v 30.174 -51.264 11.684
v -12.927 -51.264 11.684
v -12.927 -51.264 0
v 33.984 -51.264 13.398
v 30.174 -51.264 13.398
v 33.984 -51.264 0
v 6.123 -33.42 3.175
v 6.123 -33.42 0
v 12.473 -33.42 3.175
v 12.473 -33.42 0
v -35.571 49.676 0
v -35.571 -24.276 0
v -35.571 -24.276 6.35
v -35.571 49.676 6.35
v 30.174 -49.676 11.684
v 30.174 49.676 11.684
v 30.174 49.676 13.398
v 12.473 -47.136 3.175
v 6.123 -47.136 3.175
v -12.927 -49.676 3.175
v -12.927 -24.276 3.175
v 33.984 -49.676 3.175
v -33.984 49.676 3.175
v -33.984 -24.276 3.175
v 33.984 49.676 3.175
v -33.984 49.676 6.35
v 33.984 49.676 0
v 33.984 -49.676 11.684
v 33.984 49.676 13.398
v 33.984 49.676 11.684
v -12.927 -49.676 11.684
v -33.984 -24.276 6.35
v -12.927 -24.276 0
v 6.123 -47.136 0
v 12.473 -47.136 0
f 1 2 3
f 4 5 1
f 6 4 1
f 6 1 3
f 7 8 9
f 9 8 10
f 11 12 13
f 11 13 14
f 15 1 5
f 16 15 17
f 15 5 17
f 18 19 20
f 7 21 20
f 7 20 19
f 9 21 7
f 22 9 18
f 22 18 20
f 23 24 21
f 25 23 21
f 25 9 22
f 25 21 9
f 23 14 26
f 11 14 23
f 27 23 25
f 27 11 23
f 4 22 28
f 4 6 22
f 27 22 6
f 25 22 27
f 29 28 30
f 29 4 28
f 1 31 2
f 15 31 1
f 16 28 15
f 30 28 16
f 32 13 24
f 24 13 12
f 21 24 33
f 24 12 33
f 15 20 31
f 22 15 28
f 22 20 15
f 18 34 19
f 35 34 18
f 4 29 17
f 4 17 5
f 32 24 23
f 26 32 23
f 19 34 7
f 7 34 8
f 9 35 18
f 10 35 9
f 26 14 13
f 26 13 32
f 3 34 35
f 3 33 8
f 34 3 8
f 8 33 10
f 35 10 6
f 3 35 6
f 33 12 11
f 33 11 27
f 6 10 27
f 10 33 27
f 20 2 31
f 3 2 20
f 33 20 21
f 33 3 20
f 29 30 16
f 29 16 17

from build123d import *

# Parameters (mm, degrees)
F0_W     = 6.35
F0_H     = 13.716
F1_DEPTH = 3.175
F0_W_2   = 1.5875
F0_H_2   = 73.952875
F2_DEPTH = 6.35
F0_W_3   = 46.9108536
F0_H_3   = 1.5875
F3_DEPTH = 11.684
F6_DEPTH = 3.81


# Not quite as in the source:
# - a feature names something its author has since deleted; it is built from what else it names


with BuildPart() as f1:
    # F0 (on Top) → F1 (new body)
    with BuildSketch(Plane.XY):
        Polygon((33.9837268, -49.6764375), (33.9837268, 49.6764375), (-33.9837268, 49.6764375), (-33.9837268, -24.2764375), (-12.9271268, -24.2764375), (-12.9271268, -49.6764375), align=None)
        with Locations((9.2978732, -40.2784375)):
            Rectangle(F0_W, F0_H, mode=Mode.SUBTRACT)
    extrude(amount=F1_DEPTH)

    # F0 (on Top) → F2 (join)
    with BuildSketch(Plane.XY):
        with Locations((-34.7774768, 12.7)):
            Rectangle(F0_W_2, F0_H_2)
    extrude(amount=F2_DEPTH)

    # F0 (on Top) → F3 (join)
    with BuildSketch(Plane.XY):
        with Locations((10.5283, -50.4701875)):
            Rectangle(F0_W_3, F0_H_3)
    extrude(amount=F3_DEPTH)

    # F5 (on face) → F6 (join)
    with BuildSketch(Plane.YZ.offset(33.9837268)):
        Polygon((-51.2639375, 13.3985), (-51.2639375, 11.684), (-49.6764375, 11.684), (49.6764375, 11.684), (49.6764375, 13.3985), align=None)
    extrude(amount=-F6_DEPTH)


solid = f1.part
